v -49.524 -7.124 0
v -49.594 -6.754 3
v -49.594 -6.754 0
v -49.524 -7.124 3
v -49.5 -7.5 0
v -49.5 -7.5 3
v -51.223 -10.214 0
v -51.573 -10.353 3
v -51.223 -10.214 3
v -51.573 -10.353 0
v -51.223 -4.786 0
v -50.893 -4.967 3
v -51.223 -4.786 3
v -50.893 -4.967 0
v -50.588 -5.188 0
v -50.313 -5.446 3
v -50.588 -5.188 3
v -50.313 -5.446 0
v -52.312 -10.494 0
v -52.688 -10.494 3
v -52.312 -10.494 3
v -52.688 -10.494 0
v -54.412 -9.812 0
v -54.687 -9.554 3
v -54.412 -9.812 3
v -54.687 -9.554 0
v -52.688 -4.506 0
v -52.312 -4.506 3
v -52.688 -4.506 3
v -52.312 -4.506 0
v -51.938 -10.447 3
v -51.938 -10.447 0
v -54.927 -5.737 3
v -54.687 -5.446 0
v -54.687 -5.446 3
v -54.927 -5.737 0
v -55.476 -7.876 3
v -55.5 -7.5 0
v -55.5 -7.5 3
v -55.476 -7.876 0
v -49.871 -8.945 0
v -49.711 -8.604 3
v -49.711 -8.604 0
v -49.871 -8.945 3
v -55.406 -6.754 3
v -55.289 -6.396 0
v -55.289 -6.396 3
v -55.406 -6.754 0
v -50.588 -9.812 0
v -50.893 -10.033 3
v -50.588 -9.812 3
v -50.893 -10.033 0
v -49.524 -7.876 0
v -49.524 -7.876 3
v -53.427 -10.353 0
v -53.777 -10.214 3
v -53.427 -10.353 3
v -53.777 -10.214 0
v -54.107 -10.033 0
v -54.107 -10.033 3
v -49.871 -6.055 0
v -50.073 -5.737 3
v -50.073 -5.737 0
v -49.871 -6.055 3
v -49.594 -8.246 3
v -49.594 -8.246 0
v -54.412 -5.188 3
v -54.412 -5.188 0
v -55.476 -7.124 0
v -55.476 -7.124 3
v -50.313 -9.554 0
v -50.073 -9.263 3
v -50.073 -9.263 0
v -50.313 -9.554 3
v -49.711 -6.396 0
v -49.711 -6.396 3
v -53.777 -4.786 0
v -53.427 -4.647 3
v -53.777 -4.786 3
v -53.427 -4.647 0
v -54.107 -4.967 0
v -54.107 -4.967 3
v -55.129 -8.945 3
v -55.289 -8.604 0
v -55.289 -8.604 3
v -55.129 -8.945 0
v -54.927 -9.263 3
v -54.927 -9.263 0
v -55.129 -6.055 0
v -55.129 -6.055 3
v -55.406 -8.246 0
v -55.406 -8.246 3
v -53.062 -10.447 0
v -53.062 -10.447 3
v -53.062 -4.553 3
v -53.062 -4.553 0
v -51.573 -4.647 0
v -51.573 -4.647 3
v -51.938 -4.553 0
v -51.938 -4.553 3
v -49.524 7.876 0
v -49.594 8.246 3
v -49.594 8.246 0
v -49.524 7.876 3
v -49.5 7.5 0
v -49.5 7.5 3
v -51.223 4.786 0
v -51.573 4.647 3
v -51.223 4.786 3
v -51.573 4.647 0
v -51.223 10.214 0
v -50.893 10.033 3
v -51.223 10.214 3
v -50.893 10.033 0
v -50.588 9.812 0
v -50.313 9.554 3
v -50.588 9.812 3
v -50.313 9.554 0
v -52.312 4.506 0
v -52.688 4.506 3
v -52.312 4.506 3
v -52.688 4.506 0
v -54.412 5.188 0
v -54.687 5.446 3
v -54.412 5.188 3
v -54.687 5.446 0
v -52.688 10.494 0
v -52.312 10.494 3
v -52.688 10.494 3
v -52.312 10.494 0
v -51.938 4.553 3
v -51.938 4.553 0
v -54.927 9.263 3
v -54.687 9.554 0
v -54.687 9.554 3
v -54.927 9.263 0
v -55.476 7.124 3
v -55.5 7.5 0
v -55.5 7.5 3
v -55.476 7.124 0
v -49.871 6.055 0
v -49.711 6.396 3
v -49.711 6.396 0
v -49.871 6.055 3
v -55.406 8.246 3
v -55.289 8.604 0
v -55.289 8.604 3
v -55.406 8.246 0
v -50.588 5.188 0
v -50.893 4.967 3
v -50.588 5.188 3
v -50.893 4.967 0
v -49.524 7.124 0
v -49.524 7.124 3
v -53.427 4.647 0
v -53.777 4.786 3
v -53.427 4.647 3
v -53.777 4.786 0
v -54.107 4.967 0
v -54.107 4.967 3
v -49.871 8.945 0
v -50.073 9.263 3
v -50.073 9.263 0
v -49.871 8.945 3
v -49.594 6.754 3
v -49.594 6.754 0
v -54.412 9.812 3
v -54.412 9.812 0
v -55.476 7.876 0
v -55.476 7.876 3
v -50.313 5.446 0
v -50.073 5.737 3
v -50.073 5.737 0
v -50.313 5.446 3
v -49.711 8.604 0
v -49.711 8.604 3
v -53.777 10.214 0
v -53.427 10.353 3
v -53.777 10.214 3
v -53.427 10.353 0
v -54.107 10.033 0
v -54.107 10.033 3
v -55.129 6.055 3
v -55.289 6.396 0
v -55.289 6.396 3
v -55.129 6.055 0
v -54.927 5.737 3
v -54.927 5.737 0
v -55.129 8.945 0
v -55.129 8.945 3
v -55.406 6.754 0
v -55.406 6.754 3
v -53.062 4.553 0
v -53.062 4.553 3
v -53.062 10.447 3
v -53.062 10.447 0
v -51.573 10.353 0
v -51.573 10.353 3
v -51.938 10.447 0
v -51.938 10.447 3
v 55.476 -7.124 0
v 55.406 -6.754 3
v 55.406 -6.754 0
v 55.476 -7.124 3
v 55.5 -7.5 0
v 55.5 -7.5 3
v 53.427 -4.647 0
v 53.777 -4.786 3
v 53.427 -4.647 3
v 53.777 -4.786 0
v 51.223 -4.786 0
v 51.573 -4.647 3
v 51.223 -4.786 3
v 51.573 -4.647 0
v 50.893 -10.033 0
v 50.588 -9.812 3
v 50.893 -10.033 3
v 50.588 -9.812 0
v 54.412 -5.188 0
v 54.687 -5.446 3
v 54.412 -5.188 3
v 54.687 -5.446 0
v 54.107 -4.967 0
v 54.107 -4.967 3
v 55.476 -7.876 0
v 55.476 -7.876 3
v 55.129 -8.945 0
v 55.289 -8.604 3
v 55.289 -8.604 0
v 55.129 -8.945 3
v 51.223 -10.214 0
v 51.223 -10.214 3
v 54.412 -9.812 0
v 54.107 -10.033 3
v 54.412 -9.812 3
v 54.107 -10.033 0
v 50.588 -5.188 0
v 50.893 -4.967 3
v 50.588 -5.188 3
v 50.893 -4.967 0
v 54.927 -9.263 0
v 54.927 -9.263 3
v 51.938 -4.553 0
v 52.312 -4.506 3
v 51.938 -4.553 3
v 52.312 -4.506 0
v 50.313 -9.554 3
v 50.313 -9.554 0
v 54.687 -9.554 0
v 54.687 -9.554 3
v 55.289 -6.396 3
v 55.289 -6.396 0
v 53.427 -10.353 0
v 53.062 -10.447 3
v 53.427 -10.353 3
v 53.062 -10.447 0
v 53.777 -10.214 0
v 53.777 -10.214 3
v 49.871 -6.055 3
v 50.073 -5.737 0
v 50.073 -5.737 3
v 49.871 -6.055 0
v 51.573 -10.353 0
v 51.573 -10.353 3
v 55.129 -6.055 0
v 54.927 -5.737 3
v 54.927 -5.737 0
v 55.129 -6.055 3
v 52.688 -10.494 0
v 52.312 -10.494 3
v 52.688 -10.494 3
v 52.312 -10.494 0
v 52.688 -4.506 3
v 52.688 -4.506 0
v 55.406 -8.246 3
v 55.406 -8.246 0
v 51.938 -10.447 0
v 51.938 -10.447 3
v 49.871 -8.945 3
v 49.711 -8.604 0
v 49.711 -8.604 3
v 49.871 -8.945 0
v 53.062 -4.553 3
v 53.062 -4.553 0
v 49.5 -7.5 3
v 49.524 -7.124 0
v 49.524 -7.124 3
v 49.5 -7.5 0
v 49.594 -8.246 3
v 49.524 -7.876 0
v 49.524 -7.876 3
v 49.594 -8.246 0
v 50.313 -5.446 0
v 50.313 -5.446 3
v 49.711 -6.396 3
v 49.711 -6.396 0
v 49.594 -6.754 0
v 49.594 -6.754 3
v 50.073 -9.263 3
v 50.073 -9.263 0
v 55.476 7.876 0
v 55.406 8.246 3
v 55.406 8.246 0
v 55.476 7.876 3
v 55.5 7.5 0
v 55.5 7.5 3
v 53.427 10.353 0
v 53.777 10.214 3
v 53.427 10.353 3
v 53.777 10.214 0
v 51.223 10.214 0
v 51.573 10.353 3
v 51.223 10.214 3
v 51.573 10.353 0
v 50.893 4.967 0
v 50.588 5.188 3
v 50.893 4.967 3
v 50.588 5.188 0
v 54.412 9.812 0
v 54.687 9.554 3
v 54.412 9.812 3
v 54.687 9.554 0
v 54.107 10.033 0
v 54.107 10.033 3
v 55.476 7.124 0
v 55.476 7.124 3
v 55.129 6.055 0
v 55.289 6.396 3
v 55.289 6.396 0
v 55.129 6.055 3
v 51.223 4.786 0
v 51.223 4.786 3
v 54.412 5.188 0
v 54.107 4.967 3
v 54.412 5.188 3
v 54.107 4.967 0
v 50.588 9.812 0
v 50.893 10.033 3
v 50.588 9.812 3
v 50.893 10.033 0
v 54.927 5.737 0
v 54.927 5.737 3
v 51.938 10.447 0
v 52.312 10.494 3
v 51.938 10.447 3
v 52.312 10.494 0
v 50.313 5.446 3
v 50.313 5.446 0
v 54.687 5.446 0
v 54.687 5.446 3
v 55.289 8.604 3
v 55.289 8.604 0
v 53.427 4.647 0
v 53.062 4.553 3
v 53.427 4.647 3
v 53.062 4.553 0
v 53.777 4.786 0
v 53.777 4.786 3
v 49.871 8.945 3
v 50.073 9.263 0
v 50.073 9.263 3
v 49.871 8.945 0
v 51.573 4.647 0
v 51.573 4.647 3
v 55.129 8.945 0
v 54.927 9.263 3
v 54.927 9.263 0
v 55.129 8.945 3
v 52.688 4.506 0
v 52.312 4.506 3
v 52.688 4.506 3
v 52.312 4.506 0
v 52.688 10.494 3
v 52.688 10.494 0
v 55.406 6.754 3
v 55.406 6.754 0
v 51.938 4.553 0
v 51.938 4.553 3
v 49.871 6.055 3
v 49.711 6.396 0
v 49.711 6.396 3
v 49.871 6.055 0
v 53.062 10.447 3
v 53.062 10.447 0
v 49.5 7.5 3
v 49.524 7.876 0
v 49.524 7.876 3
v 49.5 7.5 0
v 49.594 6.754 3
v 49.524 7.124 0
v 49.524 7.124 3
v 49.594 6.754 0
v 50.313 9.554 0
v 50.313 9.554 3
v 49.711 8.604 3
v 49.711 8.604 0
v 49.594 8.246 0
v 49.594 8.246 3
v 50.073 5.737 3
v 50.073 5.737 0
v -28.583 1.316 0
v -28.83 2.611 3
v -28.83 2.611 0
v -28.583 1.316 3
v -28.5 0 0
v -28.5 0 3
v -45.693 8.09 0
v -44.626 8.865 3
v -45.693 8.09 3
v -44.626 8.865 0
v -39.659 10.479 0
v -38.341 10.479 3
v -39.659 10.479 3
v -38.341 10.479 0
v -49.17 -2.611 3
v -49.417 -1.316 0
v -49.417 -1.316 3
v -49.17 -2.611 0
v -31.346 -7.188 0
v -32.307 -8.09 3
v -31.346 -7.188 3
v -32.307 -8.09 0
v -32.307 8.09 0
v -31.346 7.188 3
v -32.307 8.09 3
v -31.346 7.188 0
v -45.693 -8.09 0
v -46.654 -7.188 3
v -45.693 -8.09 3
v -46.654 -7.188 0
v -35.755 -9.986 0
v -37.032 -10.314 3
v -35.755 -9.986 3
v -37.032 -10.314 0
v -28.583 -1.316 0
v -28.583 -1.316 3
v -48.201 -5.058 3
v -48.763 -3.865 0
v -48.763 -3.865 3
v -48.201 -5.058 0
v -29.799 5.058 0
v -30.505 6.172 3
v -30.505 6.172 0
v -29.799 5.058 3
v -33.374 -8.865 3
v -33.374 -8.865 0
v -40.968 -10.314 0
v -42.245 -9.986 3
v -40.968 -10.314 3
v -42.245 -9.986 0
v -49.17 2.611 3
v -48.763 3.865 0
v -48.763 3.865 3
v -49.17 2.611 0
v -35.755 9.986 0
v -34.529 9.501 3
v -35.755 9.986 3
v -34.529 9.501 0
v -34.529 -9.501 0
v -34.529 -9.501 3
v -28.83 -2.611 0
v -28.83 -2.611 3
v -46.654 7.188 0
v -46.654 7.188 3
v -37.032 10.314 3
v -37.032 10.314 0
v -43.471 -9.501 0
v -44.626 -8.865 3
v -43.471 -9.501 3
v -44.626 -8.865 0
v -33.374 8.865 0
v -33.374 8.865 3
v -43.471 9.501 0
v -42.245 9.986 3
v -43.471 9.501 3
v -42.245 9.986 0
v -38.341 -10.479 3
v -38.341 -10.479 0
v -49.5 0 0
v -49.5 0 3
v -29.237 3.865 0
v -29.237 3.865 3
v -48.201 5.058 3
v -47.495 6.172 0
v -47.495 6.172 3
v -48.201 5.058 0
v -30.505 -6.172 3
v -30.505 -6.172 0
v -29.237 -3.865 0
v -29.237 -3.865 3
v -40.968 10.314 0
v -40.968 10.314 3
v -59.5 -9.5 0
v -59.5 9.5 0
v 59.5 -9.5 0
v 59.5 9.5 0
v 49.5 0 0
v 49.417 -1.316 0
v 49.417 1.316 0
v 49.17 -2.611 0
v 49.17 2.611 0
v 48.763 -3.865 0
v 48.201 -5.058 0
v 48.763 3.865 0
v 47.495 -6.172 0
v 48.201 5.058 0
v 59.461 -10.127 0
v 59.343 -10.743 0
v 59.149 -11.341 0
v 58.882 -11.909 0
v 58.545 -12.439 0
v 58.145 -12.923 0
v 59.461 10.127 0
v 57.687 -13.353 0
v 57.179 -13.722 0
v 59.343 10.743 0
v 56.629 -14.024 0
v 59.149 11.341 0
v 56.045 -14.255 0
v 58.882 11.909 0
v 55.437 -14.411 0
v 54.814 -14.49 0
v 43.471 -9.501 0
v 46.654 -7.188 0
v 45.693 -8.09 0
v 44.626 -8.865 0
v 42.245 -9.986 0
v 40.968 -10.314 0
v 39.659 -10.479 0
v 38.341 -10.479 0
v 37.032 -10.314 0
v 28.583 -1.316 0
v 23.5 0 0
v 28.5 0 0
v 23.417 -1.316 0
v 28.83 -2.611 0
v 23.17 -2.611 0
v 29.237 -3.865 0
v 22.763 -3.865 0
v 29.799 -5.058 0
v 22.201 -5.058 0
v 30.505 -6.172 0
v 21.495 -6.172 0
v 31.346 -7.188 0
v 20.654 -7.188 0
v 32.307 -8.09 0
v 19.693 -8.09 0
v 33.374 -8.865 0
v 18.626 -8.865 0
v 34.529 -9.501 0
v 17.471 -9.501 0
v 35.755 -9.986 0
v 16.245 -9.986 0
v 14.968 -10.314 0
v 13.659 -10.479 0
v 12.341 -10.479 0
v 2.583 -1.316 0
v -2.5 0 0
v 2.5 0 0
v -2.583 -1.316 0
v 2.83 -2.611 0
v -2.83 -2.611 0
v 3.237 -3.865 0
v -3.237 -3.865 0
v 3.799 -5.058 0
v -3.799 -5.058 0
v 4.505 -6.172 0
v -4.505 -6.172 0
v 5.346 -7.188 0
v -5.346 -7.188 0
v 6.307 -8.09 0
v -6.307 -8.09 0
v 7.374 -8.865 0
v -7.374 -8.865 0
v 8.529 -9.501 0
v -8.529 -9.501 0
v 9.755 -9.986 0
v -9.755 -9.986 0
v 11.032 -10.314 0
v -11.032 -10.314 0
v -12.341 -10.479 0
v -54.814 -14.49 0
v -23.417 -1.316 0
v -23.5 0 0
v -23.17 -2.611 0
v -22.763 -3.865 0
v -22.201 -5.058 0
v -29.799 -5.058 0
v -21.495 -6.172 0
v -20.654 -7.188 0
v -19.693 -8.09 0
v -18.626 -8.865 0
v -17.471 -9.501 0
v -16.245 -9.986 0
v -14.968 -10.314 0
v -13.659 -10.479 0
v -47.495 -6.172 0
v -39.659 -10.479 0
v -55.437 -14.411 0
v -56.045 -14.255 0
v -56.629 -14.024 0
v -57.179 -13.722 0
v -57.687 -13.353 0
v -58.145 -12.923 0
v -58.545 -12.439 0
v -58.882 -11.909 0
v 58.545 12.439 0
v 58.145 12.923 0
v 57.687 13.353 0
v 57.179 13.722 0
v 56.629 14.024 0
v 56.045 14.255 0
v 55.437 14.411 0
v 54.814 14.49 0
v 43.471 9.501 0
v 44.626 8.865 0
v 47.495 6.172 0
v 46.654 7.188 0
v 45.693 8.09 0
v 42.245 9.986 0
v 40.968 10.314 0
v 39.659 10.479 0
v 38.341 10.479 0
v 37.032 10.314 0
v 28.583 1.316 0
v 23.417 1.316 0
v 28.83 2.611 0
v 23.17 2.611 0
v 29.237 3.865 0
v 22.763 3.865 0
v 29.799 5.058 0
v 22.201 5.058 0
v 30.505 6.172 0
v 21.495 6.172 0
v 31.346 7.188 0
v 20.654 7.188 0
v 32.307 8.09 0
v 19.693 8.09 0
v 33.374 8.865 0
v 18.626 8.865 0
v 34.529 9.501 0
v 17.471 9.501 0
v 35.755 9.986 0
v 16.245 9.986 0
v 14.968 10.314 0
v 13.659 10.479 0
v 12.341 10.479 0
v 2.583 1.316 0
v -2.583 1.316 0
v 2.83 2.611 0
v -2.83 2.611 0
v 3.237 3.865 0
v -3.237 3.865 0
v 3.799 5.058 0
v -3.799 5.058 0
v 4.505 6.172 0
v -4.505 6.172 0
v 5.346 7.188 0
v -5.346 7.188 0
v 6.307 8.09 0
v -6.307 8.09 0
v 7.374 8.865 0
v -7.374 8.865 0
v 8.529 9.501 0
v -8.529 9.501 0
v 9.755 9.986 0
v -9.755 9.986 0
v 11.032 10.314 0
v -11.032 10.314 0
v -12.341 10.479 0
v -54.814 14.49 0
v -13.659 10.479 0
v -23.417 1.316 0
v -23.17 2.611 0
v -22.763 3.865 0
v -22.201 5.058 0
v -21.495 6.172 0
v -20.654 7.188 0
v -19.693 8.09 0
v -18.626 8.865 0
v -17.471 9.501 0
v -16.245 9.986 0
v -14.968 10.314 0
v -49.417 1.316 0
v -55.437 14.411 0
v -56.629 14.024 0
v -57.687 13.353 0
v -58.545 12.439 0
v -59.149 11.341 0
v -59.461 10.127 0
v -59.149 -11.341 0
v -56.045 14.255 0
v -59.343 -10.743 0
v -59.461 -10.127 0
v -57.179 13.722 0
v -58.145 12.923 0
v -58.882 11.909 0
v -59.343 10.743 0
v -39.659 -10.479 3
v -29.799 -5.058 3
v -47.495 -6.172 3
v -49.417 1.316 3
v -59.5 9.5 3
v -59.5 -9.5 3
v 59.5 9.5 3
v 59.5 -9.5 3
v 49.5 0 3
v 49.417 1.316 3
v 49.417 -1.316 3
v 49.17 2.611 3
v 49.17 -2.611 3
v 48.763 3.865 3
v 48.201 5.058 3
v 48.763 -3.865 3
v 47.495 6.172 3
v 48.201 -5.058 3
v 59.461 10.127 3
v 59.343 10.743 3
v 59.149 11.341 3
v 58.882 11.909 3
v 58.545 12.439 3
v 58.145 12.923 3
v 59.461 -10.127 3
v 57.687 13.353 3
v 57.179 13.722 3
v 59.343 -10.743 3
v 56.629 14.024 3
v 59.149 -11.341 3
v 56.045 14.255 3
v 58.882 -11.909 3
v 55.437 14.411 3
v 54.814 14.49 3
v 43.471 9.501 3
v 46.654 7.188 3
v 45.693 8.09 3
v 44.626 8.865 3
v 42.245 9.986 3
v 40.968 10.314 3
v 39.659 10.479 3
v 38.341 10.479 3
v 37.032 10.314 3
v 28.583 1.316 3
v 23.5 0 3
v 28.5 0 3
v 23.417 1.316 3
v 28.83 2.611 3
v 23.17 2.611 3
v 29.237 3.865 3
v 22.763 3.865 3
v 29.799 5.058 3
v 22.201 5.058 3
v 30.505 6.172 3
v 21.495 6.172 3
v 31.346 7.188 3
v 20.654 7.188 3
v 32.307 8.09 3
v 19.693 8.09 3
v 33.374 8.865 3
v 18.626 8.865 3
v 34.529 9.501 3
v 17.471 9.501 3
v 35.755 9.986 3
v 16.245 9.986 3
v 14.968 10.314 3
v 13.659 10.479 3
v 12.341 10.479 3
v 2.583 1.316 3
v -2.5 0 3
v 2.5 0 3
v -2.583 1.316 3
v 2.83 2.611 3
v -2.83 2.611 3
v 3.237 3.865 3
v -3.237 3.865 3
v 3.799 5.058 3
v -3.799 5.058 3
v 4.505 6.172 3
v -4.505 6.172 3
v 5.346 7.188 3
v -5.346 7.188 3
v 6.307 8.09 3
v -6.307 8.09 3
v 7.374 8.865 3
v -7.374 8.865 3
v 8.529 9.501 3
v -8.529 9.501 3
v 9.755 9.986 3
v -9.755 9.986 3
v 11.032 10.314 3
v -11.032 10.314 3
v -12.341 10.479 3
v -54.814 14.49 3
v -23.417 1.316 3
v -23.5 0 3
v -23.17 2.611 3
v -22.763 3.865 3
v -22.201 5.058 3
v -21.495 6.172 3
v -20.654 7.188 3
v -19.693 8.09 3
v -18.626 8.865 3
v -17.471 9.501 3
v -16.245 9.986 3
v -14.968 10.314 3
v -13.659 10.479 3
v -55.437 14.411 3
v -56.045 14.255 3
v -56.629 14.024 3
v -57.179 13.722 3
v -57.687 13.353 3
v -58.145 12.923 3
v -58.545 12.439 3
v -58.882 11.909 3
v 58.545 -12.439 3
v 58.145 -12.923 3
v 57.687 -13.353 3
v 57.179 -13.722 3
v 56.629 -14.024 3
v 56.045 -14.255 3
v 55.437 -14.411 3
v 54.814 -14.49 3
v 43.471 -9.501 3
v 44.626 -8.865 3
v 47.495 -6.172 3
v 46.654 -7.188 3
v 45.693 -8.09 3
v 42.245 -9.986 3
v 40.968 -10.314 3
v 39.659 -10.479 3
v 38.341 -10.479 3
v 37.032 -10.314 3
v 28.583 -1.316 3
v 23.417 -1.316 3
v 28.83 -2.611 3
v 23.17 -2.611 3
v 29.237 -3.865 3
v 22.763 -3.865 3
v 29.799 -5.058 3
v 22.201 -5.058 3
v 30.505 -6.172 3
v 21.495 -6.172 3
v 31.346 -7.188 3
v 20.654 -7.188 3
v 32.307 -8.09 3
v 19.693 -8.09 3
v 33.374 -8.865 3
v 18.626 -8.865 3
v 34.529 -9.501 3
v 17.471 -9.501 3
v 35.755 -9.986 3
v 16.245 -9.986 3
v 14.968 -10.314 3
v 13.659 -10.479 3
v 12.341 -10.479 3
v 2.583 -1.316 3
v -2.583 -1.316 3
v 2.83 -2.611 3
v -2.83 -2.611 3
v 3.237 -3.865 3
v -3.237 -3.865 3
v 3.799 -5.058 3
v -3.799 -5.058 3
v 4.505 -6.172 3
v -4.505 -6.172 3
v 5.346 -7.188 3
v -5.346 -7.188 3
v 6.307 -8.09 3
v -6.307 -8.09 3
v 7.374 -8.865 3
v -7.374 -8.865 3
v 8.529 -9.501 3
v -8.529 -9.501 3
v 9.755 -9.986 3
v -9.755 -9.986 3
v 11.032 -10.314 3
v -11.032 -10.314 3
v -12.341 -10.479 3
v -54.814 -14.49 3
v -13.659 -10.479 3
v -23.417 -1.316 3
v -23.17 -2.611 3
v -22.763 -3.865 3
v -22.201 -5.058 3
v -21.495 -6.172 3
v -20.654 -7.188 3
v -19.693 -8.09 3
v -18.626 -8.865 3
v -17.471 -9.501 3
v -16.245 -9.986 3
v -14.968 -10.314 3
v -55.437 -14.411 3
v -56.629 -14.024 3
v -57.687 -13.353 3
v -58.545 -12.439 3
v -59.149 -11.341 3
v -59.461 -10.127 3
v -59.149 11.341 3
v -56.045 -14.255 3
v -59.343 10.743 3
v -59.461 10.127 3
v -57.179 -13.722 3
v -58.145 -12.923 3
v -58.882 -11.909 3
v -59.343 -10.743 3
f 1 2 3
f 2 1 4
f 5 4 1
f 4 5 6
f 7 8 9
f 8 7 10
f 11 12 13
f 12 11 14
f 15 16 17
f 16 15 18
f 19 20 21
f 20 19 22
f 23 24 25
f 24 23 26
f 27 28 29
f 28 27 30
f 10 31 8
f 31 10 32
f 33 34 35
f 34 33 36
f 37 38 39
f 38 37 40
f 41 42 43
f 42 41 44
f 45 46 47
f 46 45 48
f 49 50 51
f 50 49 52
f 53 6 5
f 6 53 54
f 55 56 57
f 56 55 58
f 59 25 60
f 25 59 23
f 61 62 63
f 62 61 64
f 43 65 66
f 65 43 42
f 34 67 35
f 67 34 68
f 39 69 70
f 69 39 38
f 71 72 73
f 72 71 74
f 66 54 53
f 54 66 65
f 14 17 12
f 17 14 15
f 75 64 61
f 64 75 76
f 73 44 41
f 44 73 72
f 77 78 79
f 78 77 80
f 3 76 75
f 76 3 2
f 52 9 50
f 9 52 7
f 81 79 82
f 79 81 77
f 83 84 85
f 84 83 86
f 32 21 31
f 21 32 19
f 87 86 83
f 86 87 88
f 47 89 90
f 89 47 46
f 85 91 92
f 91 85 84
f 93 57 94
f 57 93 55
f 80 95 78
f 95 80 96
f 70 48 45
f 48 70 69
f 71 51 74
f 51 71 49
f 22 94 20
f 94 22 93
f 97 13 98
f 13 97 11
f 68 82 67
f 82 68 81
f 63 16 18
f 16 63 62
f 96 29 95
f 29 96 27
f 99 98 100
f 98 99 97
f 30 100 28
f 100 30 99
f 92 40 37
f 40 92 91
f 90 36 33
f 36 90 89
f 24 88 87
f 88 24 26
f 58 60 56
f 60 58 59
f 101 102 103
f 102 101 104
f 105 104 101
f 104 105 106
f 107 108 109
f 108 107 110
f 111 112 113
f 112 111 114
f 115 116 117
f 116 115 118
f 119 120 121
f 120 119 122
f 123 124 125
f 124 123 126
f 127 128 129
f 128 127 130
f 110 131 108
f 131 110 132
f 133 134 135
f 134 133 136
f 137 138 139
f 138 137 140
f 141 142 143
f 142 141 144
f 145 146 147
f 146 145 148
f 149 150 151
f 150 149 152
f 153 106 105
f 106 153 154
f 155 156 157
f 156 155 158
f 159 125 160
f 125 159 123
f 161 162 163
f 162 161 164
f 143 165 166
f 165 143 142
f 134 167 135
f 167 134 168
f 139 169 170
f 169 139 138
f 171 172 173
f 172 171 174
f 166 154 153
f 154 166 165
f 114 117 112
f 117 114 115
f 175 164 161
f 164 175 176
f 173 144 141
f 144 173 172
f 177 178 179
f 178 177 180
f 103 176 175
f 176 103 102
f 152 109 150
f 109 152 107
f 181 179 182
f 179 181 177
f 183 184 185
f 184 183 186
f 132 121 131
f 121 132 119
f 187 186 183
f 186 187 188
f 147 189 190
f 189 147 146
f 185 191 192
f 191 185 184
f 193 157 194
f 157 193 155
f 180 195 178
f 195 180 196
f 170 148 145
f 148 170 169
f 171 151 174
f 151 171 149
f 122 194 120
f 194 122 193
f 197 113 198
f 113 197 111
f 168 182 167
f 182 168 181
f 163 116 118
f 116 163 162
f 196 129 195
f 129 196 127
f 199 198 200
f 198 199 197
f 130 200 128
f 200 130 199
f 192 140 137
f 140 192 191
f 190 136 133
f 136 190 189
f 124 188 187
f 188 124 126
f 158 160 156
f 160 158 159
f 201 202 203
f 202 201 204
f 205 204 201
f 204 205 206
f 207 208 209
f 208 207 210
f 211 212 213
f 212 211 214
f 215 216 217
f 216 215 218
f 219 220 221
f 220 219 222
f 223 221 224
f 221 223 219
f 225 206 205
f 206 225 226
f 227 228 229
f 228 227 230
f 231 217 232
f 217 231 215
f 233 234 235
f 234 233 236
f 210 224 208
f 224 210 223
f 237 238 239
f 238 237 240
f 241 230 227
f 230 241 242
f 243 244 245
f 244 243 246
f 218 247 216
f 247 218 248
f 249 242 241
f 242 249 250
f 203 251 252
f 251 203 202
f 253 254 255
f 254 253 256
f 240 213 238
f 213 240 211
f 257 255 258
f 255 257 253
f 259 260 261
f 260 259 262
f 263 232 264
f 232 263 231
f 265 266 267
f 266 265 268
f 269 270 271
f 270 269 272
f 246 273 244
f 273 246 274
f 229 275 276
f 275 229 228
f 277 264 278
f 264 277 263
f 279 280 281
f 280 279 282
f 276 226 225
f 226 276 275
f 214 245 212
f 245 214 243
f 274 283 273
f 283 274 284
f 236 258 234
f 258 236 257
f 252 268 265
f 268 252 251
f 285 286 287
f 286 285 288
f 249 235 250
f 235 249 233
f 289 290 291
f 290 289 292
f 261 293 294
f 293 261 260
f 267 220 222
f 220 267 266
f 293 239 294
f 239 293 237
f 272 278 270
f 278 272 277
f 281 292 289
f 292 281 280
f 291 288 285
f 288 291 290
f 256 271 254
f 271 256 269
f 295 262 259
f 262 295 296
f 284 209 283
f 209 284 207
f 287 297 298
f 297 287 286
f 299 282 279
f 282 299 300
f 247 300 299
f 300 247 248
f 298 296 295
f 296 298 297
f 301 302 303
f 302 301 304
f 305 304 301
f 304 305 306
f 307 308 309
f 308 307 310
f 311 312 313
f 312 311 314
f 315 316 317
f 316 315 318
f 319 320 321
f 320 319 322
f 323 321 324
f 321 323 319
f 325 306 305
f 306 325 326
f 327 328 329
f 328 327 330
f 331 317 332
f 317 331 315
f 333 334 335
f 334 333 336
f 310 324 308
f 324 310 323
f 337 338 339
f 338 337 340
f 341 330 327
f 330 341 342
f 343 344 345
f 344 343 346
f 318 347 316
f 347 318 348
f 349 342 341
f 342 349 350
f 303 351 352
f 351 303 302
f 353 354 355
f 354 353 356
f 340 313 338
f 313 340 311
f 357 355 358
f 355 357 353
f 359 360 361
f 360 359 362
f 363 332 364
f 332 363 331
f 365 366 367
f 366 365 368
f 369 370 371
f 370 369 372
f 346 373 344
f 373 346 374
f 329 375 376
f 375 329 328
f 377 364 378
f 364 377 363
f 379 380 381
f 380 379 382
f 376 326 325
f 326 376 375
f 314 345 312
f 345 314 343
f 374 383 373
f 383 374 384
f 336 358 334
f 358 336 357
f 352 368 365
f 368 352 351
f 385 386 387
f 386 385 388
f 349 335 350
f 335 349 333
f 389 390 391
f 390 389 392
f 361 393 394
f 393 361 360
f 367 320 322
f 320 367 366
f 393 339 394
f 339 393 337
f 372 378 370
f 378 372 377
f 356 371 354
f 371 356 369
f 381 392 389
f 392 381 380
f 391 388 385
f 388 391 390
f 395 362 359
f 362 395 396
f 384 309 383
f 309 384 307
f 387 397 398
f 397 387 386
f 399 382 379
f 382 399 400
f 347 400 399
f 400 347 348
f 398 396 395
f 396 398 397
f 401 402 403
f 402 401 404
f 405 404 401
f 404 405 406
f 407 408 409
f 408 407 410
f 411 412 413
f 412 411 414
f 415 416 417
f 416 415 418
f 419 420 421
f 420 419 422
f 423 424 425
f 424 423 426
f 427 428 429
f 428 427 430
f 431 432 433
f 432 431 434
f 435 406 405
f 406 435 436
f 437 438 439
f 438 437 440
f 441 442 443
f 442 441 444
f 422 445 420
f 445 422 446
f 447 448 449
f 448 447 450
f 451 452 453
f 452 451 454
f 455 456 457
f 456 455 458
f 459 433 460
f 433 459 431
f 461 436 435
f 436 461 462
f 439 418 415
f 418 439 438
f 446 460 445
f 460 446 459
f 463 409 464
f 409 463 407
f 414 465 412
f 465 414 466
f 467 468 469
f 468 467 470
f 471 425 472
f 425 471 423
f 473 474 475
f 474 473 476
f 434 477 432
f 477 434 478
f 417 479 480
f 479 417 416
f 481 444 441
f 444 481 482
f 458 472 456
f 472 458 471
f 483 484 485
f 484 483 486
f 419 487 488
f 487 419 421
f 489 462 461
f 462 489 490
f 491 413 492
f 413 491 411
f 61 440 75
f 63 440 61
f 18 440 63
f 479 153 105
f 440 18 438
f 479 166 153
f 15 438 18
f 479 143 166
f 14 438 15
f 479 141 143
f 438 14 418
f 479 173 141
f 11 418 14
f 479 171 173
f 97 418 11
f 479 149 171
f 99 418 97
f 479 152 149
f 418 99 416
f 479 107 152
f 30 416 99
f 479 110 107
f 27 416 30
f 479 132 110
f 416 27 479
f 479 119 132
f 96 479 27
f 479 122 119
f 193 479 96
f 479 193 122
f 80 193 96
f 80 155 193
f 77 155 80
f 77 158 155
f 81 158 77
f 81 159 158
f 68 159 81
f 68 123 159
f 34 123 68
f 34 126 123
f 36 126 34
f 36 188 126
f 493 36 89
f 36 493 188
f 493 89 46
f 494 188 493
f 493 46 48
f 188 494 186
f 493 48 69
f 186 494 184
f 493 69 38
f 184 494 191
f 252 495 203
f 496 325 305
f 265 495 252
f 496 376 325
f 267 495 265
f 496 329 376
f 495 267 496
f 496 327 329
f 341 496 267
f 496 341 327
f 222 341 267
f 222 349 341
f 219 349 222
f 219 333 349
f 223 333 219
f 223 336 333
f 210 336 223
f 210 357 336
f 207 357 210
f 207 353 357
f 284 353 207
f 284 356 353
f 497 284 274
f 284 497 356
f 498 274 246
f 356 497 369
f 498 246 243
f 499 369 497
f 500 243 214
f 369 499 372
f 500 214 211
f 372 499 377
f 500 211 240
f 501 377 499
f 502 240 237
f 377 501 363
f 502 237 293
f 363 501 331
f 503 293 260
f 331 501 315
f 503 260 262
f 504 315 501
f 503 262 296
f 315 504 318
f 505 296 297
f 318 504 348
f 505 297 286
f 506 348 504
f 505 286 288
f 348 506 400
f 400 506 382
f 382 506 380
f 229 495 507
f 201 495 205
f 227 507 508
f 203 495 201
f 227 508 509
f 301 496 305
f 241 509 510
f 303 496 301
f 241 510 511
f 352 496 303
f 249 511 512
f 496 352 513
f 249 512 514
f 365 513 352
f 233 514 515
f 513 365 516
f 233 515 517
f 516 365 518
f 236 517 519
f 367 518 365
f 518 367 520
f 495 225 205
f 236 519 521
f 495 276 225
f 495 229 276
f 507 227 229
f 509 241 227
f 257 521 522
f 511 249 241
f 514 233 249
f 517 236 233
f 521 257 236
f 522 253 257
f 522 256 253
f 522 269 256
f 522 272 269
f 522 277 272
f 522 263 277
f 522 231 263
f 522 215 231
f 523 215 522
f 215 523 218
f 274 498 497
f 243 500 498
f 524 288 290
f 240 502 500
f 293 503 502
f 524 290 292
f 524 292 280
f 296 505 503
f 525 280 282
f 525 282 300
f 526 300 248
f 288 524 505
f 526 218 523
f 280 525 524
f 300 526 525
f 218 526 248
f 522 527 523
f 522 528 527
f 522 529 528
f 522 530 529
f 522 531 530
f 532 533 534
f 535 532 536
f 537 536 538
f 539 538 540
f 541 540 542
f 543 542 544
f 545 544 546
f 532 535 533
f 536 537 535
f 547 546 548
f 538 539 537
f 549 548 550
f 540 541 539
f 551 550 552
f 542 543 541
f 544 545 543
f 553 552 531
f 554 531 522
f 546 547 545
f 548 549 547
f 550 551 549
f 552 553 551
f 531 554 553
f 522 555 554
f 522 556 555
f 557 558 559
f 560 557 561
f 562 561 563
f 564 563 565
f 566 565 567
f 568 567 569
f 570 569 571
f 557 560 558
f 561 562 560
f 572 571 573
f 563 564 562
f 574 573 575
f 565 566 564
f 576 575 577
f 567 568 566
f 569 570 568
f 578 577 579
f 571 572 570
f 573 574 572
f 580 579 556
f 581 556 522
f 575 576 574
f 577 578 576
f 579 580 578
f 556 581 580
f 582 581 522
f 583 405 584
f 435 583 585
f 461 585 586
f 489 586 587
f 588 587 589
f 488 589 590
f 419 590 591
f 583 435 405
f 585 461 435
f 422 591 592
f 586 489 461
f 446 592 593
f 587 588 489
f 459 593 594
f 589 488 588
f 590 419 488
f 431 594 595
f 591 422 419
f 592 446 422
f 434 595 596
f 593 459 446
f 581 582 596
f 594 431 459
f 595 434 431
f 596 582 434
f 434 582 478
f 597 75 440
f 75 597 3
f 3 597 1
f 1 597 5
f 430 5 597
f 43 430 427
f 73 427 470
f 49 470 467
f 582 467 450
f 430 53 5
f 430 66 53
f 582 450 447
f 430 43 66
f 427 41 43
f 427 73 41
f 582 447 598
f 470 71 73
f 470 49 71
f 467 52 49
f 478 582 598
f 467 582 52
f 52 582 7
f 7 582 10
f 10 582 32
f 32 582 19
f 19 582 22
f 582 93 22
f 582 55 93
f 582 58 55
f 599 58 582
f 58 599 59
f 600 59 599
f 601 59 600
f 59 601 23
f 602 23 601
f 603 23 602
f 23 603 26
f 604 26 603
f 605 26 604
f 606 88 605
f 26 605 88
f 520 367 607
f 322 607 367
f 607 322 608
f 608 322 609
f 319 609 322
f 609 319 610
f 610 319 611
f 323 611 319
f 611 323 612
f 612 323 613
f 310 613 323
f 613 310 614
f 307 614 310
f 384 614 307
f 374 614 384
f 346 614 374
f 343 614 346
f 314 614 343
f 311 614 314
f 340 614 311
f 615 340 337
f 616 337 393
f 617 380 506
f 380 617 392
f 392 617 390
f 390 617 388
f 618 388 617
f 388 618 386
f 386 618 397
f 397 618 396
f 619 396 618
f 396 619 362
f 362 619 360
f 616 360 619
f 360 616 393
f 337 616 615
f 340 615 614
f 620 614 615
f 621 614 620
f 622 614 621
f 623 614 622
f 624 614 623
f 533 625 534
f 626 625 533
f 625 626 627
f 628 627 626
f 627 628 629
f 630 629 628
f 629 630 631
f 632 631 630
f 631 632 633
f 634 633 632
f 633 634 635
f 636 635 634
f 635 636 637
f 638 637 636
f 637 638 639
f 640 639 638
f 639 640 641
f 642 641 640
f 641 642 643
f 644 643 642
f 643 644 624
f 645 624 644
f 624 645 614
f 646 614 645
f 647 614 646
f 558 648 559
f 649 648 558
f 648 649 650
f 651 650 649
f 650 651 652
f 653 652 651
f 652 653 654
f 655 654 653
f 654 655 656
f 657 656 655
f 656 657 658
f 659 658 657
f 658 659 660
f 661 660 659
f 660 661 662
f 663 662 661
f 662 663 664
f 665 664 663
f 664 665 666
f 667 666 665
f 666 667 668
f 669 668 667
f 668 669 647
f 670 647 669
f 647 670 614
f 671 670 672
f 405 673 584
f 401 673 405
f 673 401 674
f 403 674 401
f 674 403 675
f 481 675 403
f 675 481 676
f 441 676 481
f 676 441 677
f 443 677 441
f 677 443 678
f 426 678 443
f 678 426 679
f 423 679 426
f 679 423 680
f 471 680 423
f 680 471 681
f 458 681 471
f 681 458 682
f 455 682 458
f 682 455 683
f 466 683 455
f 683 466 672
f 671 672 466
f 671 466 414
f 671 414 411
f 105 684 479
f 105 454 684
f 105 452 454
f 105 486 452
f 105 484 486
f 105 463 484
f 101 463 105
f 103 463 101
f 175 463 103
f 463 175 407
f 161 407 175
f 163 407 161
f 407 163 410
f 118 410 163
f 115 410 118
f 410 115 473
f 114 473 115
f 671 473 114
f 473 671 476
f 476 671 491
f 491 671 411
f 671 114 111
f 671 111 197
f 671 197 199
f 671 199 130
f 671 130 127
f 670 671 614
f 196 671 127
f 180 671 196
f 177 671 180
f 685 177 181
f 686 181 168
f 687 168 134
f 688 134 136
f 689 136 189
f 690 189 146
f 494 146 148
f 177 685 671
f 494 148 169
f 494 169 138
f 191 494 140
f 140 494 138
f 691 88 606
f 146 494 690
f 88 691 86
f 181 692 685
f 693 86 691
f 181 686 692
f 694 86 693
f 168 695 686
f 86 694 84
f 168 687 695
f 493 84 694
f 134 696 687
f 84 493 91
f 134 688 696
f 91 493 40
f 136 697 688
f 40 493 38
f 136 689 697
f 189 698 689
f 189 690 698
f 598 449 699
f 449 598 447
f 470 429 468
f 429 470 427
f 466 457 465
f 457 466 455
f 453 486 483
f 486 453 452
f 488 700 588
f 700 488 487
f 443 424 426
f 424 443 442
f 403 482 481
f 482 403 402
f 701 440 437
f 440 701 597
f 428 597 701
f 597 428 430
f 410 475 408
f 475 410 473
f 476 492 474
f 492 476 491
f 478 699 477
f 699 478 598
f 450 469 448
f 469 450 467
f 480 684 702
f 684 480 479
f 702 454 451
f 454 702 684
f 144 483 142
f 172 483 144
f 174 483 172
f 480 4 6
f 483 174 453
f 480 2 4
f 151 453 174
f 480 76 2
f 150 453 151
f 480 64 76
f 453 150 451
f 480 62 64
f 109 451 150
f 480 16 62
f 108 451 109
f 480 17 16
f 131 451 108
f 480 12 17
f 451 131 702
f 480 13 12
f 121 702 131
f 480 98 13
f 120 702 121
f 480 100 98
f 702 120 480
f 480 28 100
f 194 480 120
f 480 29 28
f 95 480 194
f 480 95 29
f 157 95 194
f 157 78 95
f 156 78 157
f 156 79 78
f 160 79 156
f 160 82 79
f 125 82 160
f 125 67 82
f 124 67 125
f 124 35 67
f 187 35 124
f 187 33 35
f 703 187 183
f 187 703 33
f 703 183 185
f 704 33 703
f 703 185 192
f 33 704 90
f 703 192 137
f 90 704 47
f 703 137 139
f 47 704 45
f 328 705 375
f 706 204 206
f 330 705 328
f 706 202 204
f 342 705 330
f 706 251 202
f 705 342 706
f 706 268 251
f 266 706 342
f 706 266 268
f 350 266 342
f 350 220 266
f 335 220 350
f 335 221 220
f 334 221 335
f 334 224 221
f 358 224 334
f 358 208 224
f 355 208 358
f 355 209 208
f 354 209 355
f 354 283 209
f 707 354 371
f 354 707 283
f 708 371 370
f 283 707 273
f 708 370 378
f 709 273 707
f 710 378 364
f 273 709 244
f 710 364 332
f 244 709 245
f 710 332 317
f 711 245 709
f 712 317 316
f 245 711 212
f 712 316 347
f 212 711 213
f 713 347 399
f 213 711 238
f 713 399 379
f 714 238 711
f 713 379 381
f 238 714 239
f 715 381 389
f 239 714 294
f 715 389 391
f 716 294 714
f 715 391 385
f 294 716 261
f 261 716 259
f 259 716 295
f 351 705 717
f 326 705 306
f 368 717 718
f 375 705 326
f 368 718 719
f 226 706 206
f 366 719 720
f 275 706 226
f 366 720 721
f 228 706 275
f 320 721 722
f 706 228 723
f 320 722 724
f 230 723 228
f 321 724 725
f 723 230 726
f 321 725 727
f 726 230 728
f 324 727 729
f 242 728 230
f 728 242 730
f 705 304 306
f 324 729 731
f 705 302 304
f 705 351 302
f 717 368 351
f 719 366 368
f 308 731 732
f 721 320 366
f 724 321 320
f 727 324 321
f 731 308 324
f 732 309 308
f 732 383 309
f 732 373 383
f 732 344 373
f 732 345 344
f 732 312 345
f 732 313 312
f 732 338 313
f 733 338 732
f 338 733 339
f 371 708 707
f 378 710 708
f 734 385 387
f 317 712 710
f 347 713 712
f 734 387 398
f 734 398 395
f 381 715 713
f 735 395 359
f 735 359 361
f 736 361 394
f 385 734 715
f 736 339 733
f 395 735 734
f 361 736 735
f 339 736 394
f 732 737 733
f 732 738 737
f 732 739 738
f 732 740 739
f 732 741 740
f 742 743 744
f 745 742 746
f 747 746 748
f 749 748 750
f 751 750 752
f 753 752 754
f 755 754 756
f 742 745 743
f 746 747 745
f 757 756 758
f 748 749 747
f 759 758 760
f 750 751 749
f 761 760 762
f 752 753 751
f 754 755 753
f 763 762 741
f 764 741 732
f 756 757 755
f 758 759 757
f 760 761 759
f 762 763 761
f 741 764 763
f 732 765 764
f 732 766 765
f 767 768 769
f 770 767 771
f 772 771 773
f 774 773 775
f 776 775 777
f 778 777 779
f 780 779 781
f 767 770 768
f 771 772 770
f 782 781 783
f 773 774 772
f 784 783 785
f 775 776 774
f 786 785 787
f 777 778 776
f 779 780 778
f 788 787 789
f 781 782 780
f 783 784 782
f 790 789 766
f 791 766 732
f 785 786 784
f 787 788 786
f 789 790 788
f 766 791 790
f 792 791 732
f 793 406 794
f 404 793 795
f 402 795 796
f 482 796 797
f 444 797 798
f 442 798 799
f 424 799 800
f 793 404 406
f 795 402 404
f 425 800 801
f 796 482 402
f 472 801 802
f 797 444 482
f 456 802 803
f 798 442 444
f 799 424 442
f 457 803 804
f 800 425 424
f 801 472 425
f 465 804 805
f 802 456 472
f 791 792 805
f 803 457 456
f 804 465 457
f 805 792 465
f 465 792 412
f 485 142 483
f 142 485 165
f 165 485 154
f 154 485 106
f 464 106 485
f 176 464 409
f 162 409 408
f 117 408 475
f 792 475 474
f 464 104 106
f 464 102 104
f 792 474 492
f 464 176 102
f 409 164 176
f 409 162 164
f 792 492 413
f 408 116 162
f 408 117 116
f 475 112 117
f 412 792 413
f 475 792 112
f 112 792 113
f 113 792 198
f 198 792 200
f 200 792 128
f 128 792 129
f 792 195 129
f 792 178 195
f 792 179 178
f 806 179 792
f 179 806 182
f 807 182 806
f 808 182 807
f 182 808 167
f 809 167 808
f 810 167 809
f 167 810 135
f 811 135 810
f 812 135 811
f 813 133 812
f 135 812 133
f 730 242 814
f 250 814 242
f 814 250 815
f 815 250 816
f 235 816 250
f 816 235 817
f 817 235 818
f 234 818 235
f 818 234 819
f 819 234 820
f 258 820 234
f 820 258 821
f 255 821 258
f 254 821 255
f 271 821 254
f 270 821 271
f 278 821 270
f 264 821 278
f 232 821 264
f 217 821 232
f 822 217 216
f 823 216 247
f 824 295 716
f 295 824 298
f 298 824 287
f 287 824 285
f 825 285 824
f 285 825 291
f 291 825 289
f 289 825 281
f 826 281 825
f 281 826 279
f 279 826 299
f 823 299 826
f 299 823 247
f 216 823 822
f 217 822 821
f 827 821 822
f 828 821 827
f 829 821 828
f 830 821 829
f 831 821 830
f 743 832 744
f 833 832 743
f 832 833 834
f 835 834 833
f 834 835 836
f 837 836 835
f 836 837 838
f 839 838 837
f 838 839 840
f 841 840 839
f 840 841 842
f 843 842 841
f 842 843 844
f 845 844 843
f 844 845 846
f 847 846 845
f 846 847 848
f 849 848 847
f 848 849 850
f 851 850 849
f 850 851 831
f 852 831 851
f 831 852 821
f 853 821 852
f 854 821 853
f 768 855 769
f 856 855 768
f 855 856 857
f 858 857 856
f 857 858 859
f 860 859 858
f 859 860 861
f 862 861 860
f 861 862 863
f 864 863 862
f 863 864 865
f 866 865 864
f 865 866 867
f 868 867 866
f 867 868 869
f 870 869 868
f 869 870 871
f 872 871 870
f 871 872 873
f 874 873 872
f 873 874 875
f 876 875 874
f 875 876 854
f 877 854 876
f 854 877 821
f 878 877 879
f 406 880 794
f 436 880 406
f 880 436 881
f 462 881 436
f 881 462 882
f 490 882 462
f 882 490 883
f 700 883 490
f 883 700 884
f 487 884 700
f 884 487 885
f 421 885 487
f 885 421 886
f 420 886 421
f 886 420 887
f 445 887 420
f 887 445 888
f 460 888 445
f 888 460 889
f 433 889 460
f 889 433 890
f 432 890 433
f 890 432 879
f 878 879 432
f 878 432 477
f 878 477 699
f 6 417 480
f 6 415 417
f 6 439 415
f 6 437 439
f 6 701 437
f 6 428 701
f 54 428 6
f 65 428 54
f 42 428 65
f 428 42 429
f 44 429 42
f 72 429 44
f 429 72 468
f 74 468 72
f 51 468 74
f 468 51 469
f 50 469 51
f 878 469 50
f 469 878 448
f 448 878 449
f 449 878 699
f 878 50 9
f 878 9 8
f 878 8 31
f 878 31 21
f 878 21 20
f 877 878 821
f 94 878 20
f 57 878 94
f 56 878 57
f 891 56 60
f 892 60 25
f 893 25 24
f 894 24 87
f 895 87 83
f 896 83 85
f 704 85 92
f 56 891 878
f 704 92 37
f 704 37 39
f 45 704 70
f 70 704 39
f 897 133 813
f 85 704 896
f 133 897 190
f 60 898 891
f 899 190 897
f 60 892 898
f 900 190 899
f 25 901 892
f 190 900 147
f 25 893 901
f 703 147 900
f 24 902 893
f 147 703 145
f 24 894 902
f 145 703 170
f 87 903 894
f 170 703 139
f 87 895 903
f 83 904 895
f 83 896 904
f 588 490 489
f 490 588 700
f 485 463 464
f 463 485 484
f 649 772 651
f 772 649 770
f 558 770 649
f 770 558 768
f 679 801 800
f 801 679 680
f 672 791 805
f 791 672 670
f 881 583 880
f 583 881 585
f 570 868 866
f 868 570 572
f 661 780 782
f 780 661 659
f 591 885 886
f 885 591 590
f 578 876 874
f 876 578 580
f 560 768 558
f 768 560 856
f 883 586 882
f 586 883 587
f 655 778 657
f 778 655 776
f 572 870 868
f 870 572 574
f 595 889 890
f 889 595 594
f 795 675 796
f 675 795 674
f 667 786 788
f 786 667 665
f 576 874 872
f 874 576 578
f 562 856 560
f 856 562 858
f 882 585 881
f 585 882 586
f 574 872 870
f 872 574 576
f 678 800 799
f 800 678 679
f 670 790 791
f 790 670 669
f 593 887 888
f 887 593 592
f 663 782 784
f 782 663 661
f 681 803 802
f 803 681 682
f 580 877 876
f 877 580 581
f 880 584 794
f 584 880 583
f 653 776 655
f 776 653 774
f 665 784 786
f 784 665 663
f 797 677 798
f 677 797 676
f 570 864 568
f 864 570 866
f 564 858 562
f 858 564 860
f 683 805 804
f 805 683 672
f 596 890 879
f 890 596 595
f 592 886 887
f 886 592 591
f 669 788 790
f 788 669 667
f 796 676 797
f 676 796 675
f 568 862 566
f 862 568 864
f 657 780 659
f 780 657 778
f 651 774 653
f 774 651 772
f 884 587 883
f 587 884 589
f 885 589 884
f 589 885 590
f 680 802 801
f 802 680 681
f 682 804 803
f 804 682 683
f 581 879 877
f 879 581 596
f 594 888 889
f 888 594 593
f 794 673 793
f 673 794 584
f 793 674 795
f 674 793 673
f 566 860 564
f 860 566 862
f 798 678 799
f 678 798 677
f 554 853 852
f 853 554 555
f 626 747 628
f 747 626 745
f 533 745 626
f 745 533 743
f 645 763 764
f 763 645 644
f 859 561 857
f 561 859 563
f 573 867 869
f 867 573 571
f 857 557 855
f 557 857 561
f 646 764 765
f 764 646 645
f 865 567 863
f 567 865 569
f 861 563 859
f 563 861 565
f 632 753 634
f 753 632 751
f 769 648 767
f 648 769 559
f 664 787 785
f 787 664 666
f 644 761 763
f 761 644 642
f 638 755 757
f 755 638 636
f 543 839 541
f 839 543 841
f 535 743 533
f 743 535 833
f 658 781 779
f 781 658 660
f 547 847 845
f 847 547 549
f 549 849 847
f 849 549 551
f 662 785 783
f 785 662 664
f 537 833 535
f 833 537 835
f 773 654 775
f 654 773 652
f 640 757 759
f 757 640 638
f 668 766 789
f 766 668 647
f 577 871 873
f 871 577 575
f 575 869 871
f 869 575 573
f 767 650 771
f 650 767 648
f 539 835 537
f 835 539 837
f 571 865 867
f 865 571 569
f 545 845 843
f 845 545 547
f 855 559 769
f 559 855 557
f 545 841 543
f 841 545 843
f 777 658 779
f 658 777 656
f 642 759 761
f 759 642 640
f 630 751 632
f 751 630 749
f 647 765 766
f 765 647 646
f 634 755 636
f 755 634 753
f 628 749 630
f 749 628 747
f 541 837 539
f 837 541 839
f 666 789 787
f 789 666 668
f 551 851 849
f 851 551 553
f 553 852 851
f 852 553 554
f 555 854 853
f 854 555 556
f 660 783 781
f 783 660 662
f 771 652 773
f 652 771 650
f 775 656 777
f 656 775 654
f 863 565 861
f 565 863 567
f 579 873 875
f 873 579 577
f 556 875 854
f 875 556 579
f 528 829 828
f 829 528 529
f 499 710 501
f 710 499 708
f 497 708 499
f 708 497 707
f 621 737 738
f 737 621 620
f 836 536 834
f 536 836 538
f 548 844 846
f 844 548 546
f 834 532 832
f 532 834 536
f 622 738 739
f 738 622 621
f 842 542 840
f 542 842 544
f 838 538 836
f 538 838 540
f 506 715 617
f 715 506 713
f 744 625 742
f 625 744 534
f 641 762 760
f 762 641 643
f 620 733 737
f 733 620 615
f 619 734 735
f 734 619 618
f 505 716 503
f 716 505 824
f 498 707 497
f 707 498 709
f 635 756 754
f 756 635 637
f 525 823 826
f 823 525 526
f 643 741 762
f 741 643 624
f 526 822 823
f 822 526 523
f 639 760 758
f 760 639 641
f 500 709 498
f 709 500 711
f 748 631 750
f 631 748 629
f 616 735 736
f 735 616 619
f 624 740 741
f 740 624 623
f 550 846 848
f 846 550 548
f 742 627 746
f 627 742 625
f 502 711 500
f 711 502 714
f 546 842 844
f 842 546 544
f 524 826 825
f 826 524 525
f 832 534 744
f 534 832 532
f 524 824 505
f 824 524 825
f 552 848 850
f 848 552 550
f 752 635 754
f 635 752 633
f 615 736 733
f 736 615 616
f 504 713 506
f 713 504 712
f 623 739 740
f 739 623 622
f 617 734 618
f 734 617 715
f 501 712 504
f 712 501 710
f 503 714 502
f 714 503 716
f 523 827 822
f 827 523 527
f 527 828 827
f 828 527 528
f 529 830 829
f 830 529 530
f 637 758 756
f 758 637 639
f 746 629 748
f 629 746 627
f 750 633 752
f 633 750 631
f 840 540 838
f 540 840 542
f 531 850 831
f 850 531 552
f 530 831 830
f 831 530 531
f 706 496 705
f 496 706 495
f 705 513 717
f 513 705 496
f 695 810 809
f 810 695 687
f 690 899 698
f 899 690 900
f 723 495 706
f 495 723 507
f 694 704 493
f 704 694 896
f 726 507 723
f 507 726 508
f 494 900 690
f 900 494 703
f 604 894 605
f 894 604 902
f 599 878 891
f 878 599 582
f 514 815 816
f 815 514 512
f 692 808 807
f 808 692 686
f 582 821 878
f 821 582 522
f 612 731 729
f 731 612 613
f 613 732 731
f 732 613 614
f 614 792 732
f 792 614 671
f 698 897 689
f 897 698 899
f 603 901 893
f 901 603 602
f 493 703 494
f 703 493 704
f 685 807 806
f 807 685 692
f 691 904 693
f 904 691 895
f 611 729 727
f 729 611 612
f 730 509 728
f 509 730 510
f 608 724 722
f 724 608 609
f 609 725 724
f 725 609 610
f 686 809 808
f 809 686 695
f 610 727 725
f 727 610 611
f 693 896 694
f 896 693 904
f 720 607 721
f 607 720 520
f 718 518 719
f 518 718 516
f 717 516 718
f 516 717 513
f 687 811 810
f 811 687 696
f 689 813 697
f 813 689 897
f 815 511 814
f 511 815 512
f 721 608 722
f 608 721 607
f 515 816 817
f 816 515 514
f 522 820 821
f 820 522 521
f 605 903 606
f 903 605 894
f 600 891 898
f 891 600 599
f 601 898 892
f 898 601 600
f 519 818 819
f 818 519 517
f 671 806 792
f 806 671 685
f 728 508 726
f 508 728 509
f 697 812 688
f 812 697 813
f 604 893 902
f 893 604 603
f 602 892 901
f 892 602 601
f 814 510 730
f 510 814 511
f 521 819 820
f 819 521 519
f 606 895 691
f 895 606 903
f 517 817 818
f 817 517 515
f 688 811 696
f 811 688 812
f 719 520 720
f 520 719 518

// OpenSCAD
$fn = 50;


difference() {
	union() {
		hull() {
			translate(v = [-54.5000000000, 9.5000000000, 0]) {
				cylinder(h = 3, r = 5);
			}
			translate(v = [54.5000000000, 9.5000000000, 0]) {
				cylinder(h = 3, r = 5);
			}
			translate(v = [-54.5000000000, -9.5000000000, 0]) {
				cylinder(h = 3, r = 5);
			}
			translate(v = [54.5000000000, -9.5000000000, 0]) {
				cylinder(h = 3, r = 5);
			}
		}
	}
	union() {
		#translate(v = [-52.5000000000, -7.5000000000, -100.0000000000]) {
			cylinder(h = 200, r = 3.0000000000);
		}
		#translate(v = [-52.5000000000, 7.5000000000, -100.0000000000]) {
			cylinder(h = 200, r = 3.0000000000);
		}
		#translate(v = [52.5000000000, -7.5000000000, -100.0000000000]) {
			cylinder(h = 200, r = 3.0000000000);
		}
		#translate(v = [52.5000000000, 7.5000000000, -100.0000000000]) {
			cylinder(h = 200, r = 3.0000000000);
		}
		#translate(v = [-39.0000000000, 0, 0]) {
			cylinder(h = 3, r = 10.5000000000);
		}
		#translate(v = [-13.0000000000, 0, 0]) {
			cylinder(h = 3, r = 10.5000000000);
		}
		#translate(v = [13.0000000000, 0, 0]) {
			cylinder(h = 3, r = 10.5000000000);
		}
		#translate(v = [39.0000000000, 0, 0]) {
			cylinder(h = 3, r = 10.5000000000);
		}
	}
}
